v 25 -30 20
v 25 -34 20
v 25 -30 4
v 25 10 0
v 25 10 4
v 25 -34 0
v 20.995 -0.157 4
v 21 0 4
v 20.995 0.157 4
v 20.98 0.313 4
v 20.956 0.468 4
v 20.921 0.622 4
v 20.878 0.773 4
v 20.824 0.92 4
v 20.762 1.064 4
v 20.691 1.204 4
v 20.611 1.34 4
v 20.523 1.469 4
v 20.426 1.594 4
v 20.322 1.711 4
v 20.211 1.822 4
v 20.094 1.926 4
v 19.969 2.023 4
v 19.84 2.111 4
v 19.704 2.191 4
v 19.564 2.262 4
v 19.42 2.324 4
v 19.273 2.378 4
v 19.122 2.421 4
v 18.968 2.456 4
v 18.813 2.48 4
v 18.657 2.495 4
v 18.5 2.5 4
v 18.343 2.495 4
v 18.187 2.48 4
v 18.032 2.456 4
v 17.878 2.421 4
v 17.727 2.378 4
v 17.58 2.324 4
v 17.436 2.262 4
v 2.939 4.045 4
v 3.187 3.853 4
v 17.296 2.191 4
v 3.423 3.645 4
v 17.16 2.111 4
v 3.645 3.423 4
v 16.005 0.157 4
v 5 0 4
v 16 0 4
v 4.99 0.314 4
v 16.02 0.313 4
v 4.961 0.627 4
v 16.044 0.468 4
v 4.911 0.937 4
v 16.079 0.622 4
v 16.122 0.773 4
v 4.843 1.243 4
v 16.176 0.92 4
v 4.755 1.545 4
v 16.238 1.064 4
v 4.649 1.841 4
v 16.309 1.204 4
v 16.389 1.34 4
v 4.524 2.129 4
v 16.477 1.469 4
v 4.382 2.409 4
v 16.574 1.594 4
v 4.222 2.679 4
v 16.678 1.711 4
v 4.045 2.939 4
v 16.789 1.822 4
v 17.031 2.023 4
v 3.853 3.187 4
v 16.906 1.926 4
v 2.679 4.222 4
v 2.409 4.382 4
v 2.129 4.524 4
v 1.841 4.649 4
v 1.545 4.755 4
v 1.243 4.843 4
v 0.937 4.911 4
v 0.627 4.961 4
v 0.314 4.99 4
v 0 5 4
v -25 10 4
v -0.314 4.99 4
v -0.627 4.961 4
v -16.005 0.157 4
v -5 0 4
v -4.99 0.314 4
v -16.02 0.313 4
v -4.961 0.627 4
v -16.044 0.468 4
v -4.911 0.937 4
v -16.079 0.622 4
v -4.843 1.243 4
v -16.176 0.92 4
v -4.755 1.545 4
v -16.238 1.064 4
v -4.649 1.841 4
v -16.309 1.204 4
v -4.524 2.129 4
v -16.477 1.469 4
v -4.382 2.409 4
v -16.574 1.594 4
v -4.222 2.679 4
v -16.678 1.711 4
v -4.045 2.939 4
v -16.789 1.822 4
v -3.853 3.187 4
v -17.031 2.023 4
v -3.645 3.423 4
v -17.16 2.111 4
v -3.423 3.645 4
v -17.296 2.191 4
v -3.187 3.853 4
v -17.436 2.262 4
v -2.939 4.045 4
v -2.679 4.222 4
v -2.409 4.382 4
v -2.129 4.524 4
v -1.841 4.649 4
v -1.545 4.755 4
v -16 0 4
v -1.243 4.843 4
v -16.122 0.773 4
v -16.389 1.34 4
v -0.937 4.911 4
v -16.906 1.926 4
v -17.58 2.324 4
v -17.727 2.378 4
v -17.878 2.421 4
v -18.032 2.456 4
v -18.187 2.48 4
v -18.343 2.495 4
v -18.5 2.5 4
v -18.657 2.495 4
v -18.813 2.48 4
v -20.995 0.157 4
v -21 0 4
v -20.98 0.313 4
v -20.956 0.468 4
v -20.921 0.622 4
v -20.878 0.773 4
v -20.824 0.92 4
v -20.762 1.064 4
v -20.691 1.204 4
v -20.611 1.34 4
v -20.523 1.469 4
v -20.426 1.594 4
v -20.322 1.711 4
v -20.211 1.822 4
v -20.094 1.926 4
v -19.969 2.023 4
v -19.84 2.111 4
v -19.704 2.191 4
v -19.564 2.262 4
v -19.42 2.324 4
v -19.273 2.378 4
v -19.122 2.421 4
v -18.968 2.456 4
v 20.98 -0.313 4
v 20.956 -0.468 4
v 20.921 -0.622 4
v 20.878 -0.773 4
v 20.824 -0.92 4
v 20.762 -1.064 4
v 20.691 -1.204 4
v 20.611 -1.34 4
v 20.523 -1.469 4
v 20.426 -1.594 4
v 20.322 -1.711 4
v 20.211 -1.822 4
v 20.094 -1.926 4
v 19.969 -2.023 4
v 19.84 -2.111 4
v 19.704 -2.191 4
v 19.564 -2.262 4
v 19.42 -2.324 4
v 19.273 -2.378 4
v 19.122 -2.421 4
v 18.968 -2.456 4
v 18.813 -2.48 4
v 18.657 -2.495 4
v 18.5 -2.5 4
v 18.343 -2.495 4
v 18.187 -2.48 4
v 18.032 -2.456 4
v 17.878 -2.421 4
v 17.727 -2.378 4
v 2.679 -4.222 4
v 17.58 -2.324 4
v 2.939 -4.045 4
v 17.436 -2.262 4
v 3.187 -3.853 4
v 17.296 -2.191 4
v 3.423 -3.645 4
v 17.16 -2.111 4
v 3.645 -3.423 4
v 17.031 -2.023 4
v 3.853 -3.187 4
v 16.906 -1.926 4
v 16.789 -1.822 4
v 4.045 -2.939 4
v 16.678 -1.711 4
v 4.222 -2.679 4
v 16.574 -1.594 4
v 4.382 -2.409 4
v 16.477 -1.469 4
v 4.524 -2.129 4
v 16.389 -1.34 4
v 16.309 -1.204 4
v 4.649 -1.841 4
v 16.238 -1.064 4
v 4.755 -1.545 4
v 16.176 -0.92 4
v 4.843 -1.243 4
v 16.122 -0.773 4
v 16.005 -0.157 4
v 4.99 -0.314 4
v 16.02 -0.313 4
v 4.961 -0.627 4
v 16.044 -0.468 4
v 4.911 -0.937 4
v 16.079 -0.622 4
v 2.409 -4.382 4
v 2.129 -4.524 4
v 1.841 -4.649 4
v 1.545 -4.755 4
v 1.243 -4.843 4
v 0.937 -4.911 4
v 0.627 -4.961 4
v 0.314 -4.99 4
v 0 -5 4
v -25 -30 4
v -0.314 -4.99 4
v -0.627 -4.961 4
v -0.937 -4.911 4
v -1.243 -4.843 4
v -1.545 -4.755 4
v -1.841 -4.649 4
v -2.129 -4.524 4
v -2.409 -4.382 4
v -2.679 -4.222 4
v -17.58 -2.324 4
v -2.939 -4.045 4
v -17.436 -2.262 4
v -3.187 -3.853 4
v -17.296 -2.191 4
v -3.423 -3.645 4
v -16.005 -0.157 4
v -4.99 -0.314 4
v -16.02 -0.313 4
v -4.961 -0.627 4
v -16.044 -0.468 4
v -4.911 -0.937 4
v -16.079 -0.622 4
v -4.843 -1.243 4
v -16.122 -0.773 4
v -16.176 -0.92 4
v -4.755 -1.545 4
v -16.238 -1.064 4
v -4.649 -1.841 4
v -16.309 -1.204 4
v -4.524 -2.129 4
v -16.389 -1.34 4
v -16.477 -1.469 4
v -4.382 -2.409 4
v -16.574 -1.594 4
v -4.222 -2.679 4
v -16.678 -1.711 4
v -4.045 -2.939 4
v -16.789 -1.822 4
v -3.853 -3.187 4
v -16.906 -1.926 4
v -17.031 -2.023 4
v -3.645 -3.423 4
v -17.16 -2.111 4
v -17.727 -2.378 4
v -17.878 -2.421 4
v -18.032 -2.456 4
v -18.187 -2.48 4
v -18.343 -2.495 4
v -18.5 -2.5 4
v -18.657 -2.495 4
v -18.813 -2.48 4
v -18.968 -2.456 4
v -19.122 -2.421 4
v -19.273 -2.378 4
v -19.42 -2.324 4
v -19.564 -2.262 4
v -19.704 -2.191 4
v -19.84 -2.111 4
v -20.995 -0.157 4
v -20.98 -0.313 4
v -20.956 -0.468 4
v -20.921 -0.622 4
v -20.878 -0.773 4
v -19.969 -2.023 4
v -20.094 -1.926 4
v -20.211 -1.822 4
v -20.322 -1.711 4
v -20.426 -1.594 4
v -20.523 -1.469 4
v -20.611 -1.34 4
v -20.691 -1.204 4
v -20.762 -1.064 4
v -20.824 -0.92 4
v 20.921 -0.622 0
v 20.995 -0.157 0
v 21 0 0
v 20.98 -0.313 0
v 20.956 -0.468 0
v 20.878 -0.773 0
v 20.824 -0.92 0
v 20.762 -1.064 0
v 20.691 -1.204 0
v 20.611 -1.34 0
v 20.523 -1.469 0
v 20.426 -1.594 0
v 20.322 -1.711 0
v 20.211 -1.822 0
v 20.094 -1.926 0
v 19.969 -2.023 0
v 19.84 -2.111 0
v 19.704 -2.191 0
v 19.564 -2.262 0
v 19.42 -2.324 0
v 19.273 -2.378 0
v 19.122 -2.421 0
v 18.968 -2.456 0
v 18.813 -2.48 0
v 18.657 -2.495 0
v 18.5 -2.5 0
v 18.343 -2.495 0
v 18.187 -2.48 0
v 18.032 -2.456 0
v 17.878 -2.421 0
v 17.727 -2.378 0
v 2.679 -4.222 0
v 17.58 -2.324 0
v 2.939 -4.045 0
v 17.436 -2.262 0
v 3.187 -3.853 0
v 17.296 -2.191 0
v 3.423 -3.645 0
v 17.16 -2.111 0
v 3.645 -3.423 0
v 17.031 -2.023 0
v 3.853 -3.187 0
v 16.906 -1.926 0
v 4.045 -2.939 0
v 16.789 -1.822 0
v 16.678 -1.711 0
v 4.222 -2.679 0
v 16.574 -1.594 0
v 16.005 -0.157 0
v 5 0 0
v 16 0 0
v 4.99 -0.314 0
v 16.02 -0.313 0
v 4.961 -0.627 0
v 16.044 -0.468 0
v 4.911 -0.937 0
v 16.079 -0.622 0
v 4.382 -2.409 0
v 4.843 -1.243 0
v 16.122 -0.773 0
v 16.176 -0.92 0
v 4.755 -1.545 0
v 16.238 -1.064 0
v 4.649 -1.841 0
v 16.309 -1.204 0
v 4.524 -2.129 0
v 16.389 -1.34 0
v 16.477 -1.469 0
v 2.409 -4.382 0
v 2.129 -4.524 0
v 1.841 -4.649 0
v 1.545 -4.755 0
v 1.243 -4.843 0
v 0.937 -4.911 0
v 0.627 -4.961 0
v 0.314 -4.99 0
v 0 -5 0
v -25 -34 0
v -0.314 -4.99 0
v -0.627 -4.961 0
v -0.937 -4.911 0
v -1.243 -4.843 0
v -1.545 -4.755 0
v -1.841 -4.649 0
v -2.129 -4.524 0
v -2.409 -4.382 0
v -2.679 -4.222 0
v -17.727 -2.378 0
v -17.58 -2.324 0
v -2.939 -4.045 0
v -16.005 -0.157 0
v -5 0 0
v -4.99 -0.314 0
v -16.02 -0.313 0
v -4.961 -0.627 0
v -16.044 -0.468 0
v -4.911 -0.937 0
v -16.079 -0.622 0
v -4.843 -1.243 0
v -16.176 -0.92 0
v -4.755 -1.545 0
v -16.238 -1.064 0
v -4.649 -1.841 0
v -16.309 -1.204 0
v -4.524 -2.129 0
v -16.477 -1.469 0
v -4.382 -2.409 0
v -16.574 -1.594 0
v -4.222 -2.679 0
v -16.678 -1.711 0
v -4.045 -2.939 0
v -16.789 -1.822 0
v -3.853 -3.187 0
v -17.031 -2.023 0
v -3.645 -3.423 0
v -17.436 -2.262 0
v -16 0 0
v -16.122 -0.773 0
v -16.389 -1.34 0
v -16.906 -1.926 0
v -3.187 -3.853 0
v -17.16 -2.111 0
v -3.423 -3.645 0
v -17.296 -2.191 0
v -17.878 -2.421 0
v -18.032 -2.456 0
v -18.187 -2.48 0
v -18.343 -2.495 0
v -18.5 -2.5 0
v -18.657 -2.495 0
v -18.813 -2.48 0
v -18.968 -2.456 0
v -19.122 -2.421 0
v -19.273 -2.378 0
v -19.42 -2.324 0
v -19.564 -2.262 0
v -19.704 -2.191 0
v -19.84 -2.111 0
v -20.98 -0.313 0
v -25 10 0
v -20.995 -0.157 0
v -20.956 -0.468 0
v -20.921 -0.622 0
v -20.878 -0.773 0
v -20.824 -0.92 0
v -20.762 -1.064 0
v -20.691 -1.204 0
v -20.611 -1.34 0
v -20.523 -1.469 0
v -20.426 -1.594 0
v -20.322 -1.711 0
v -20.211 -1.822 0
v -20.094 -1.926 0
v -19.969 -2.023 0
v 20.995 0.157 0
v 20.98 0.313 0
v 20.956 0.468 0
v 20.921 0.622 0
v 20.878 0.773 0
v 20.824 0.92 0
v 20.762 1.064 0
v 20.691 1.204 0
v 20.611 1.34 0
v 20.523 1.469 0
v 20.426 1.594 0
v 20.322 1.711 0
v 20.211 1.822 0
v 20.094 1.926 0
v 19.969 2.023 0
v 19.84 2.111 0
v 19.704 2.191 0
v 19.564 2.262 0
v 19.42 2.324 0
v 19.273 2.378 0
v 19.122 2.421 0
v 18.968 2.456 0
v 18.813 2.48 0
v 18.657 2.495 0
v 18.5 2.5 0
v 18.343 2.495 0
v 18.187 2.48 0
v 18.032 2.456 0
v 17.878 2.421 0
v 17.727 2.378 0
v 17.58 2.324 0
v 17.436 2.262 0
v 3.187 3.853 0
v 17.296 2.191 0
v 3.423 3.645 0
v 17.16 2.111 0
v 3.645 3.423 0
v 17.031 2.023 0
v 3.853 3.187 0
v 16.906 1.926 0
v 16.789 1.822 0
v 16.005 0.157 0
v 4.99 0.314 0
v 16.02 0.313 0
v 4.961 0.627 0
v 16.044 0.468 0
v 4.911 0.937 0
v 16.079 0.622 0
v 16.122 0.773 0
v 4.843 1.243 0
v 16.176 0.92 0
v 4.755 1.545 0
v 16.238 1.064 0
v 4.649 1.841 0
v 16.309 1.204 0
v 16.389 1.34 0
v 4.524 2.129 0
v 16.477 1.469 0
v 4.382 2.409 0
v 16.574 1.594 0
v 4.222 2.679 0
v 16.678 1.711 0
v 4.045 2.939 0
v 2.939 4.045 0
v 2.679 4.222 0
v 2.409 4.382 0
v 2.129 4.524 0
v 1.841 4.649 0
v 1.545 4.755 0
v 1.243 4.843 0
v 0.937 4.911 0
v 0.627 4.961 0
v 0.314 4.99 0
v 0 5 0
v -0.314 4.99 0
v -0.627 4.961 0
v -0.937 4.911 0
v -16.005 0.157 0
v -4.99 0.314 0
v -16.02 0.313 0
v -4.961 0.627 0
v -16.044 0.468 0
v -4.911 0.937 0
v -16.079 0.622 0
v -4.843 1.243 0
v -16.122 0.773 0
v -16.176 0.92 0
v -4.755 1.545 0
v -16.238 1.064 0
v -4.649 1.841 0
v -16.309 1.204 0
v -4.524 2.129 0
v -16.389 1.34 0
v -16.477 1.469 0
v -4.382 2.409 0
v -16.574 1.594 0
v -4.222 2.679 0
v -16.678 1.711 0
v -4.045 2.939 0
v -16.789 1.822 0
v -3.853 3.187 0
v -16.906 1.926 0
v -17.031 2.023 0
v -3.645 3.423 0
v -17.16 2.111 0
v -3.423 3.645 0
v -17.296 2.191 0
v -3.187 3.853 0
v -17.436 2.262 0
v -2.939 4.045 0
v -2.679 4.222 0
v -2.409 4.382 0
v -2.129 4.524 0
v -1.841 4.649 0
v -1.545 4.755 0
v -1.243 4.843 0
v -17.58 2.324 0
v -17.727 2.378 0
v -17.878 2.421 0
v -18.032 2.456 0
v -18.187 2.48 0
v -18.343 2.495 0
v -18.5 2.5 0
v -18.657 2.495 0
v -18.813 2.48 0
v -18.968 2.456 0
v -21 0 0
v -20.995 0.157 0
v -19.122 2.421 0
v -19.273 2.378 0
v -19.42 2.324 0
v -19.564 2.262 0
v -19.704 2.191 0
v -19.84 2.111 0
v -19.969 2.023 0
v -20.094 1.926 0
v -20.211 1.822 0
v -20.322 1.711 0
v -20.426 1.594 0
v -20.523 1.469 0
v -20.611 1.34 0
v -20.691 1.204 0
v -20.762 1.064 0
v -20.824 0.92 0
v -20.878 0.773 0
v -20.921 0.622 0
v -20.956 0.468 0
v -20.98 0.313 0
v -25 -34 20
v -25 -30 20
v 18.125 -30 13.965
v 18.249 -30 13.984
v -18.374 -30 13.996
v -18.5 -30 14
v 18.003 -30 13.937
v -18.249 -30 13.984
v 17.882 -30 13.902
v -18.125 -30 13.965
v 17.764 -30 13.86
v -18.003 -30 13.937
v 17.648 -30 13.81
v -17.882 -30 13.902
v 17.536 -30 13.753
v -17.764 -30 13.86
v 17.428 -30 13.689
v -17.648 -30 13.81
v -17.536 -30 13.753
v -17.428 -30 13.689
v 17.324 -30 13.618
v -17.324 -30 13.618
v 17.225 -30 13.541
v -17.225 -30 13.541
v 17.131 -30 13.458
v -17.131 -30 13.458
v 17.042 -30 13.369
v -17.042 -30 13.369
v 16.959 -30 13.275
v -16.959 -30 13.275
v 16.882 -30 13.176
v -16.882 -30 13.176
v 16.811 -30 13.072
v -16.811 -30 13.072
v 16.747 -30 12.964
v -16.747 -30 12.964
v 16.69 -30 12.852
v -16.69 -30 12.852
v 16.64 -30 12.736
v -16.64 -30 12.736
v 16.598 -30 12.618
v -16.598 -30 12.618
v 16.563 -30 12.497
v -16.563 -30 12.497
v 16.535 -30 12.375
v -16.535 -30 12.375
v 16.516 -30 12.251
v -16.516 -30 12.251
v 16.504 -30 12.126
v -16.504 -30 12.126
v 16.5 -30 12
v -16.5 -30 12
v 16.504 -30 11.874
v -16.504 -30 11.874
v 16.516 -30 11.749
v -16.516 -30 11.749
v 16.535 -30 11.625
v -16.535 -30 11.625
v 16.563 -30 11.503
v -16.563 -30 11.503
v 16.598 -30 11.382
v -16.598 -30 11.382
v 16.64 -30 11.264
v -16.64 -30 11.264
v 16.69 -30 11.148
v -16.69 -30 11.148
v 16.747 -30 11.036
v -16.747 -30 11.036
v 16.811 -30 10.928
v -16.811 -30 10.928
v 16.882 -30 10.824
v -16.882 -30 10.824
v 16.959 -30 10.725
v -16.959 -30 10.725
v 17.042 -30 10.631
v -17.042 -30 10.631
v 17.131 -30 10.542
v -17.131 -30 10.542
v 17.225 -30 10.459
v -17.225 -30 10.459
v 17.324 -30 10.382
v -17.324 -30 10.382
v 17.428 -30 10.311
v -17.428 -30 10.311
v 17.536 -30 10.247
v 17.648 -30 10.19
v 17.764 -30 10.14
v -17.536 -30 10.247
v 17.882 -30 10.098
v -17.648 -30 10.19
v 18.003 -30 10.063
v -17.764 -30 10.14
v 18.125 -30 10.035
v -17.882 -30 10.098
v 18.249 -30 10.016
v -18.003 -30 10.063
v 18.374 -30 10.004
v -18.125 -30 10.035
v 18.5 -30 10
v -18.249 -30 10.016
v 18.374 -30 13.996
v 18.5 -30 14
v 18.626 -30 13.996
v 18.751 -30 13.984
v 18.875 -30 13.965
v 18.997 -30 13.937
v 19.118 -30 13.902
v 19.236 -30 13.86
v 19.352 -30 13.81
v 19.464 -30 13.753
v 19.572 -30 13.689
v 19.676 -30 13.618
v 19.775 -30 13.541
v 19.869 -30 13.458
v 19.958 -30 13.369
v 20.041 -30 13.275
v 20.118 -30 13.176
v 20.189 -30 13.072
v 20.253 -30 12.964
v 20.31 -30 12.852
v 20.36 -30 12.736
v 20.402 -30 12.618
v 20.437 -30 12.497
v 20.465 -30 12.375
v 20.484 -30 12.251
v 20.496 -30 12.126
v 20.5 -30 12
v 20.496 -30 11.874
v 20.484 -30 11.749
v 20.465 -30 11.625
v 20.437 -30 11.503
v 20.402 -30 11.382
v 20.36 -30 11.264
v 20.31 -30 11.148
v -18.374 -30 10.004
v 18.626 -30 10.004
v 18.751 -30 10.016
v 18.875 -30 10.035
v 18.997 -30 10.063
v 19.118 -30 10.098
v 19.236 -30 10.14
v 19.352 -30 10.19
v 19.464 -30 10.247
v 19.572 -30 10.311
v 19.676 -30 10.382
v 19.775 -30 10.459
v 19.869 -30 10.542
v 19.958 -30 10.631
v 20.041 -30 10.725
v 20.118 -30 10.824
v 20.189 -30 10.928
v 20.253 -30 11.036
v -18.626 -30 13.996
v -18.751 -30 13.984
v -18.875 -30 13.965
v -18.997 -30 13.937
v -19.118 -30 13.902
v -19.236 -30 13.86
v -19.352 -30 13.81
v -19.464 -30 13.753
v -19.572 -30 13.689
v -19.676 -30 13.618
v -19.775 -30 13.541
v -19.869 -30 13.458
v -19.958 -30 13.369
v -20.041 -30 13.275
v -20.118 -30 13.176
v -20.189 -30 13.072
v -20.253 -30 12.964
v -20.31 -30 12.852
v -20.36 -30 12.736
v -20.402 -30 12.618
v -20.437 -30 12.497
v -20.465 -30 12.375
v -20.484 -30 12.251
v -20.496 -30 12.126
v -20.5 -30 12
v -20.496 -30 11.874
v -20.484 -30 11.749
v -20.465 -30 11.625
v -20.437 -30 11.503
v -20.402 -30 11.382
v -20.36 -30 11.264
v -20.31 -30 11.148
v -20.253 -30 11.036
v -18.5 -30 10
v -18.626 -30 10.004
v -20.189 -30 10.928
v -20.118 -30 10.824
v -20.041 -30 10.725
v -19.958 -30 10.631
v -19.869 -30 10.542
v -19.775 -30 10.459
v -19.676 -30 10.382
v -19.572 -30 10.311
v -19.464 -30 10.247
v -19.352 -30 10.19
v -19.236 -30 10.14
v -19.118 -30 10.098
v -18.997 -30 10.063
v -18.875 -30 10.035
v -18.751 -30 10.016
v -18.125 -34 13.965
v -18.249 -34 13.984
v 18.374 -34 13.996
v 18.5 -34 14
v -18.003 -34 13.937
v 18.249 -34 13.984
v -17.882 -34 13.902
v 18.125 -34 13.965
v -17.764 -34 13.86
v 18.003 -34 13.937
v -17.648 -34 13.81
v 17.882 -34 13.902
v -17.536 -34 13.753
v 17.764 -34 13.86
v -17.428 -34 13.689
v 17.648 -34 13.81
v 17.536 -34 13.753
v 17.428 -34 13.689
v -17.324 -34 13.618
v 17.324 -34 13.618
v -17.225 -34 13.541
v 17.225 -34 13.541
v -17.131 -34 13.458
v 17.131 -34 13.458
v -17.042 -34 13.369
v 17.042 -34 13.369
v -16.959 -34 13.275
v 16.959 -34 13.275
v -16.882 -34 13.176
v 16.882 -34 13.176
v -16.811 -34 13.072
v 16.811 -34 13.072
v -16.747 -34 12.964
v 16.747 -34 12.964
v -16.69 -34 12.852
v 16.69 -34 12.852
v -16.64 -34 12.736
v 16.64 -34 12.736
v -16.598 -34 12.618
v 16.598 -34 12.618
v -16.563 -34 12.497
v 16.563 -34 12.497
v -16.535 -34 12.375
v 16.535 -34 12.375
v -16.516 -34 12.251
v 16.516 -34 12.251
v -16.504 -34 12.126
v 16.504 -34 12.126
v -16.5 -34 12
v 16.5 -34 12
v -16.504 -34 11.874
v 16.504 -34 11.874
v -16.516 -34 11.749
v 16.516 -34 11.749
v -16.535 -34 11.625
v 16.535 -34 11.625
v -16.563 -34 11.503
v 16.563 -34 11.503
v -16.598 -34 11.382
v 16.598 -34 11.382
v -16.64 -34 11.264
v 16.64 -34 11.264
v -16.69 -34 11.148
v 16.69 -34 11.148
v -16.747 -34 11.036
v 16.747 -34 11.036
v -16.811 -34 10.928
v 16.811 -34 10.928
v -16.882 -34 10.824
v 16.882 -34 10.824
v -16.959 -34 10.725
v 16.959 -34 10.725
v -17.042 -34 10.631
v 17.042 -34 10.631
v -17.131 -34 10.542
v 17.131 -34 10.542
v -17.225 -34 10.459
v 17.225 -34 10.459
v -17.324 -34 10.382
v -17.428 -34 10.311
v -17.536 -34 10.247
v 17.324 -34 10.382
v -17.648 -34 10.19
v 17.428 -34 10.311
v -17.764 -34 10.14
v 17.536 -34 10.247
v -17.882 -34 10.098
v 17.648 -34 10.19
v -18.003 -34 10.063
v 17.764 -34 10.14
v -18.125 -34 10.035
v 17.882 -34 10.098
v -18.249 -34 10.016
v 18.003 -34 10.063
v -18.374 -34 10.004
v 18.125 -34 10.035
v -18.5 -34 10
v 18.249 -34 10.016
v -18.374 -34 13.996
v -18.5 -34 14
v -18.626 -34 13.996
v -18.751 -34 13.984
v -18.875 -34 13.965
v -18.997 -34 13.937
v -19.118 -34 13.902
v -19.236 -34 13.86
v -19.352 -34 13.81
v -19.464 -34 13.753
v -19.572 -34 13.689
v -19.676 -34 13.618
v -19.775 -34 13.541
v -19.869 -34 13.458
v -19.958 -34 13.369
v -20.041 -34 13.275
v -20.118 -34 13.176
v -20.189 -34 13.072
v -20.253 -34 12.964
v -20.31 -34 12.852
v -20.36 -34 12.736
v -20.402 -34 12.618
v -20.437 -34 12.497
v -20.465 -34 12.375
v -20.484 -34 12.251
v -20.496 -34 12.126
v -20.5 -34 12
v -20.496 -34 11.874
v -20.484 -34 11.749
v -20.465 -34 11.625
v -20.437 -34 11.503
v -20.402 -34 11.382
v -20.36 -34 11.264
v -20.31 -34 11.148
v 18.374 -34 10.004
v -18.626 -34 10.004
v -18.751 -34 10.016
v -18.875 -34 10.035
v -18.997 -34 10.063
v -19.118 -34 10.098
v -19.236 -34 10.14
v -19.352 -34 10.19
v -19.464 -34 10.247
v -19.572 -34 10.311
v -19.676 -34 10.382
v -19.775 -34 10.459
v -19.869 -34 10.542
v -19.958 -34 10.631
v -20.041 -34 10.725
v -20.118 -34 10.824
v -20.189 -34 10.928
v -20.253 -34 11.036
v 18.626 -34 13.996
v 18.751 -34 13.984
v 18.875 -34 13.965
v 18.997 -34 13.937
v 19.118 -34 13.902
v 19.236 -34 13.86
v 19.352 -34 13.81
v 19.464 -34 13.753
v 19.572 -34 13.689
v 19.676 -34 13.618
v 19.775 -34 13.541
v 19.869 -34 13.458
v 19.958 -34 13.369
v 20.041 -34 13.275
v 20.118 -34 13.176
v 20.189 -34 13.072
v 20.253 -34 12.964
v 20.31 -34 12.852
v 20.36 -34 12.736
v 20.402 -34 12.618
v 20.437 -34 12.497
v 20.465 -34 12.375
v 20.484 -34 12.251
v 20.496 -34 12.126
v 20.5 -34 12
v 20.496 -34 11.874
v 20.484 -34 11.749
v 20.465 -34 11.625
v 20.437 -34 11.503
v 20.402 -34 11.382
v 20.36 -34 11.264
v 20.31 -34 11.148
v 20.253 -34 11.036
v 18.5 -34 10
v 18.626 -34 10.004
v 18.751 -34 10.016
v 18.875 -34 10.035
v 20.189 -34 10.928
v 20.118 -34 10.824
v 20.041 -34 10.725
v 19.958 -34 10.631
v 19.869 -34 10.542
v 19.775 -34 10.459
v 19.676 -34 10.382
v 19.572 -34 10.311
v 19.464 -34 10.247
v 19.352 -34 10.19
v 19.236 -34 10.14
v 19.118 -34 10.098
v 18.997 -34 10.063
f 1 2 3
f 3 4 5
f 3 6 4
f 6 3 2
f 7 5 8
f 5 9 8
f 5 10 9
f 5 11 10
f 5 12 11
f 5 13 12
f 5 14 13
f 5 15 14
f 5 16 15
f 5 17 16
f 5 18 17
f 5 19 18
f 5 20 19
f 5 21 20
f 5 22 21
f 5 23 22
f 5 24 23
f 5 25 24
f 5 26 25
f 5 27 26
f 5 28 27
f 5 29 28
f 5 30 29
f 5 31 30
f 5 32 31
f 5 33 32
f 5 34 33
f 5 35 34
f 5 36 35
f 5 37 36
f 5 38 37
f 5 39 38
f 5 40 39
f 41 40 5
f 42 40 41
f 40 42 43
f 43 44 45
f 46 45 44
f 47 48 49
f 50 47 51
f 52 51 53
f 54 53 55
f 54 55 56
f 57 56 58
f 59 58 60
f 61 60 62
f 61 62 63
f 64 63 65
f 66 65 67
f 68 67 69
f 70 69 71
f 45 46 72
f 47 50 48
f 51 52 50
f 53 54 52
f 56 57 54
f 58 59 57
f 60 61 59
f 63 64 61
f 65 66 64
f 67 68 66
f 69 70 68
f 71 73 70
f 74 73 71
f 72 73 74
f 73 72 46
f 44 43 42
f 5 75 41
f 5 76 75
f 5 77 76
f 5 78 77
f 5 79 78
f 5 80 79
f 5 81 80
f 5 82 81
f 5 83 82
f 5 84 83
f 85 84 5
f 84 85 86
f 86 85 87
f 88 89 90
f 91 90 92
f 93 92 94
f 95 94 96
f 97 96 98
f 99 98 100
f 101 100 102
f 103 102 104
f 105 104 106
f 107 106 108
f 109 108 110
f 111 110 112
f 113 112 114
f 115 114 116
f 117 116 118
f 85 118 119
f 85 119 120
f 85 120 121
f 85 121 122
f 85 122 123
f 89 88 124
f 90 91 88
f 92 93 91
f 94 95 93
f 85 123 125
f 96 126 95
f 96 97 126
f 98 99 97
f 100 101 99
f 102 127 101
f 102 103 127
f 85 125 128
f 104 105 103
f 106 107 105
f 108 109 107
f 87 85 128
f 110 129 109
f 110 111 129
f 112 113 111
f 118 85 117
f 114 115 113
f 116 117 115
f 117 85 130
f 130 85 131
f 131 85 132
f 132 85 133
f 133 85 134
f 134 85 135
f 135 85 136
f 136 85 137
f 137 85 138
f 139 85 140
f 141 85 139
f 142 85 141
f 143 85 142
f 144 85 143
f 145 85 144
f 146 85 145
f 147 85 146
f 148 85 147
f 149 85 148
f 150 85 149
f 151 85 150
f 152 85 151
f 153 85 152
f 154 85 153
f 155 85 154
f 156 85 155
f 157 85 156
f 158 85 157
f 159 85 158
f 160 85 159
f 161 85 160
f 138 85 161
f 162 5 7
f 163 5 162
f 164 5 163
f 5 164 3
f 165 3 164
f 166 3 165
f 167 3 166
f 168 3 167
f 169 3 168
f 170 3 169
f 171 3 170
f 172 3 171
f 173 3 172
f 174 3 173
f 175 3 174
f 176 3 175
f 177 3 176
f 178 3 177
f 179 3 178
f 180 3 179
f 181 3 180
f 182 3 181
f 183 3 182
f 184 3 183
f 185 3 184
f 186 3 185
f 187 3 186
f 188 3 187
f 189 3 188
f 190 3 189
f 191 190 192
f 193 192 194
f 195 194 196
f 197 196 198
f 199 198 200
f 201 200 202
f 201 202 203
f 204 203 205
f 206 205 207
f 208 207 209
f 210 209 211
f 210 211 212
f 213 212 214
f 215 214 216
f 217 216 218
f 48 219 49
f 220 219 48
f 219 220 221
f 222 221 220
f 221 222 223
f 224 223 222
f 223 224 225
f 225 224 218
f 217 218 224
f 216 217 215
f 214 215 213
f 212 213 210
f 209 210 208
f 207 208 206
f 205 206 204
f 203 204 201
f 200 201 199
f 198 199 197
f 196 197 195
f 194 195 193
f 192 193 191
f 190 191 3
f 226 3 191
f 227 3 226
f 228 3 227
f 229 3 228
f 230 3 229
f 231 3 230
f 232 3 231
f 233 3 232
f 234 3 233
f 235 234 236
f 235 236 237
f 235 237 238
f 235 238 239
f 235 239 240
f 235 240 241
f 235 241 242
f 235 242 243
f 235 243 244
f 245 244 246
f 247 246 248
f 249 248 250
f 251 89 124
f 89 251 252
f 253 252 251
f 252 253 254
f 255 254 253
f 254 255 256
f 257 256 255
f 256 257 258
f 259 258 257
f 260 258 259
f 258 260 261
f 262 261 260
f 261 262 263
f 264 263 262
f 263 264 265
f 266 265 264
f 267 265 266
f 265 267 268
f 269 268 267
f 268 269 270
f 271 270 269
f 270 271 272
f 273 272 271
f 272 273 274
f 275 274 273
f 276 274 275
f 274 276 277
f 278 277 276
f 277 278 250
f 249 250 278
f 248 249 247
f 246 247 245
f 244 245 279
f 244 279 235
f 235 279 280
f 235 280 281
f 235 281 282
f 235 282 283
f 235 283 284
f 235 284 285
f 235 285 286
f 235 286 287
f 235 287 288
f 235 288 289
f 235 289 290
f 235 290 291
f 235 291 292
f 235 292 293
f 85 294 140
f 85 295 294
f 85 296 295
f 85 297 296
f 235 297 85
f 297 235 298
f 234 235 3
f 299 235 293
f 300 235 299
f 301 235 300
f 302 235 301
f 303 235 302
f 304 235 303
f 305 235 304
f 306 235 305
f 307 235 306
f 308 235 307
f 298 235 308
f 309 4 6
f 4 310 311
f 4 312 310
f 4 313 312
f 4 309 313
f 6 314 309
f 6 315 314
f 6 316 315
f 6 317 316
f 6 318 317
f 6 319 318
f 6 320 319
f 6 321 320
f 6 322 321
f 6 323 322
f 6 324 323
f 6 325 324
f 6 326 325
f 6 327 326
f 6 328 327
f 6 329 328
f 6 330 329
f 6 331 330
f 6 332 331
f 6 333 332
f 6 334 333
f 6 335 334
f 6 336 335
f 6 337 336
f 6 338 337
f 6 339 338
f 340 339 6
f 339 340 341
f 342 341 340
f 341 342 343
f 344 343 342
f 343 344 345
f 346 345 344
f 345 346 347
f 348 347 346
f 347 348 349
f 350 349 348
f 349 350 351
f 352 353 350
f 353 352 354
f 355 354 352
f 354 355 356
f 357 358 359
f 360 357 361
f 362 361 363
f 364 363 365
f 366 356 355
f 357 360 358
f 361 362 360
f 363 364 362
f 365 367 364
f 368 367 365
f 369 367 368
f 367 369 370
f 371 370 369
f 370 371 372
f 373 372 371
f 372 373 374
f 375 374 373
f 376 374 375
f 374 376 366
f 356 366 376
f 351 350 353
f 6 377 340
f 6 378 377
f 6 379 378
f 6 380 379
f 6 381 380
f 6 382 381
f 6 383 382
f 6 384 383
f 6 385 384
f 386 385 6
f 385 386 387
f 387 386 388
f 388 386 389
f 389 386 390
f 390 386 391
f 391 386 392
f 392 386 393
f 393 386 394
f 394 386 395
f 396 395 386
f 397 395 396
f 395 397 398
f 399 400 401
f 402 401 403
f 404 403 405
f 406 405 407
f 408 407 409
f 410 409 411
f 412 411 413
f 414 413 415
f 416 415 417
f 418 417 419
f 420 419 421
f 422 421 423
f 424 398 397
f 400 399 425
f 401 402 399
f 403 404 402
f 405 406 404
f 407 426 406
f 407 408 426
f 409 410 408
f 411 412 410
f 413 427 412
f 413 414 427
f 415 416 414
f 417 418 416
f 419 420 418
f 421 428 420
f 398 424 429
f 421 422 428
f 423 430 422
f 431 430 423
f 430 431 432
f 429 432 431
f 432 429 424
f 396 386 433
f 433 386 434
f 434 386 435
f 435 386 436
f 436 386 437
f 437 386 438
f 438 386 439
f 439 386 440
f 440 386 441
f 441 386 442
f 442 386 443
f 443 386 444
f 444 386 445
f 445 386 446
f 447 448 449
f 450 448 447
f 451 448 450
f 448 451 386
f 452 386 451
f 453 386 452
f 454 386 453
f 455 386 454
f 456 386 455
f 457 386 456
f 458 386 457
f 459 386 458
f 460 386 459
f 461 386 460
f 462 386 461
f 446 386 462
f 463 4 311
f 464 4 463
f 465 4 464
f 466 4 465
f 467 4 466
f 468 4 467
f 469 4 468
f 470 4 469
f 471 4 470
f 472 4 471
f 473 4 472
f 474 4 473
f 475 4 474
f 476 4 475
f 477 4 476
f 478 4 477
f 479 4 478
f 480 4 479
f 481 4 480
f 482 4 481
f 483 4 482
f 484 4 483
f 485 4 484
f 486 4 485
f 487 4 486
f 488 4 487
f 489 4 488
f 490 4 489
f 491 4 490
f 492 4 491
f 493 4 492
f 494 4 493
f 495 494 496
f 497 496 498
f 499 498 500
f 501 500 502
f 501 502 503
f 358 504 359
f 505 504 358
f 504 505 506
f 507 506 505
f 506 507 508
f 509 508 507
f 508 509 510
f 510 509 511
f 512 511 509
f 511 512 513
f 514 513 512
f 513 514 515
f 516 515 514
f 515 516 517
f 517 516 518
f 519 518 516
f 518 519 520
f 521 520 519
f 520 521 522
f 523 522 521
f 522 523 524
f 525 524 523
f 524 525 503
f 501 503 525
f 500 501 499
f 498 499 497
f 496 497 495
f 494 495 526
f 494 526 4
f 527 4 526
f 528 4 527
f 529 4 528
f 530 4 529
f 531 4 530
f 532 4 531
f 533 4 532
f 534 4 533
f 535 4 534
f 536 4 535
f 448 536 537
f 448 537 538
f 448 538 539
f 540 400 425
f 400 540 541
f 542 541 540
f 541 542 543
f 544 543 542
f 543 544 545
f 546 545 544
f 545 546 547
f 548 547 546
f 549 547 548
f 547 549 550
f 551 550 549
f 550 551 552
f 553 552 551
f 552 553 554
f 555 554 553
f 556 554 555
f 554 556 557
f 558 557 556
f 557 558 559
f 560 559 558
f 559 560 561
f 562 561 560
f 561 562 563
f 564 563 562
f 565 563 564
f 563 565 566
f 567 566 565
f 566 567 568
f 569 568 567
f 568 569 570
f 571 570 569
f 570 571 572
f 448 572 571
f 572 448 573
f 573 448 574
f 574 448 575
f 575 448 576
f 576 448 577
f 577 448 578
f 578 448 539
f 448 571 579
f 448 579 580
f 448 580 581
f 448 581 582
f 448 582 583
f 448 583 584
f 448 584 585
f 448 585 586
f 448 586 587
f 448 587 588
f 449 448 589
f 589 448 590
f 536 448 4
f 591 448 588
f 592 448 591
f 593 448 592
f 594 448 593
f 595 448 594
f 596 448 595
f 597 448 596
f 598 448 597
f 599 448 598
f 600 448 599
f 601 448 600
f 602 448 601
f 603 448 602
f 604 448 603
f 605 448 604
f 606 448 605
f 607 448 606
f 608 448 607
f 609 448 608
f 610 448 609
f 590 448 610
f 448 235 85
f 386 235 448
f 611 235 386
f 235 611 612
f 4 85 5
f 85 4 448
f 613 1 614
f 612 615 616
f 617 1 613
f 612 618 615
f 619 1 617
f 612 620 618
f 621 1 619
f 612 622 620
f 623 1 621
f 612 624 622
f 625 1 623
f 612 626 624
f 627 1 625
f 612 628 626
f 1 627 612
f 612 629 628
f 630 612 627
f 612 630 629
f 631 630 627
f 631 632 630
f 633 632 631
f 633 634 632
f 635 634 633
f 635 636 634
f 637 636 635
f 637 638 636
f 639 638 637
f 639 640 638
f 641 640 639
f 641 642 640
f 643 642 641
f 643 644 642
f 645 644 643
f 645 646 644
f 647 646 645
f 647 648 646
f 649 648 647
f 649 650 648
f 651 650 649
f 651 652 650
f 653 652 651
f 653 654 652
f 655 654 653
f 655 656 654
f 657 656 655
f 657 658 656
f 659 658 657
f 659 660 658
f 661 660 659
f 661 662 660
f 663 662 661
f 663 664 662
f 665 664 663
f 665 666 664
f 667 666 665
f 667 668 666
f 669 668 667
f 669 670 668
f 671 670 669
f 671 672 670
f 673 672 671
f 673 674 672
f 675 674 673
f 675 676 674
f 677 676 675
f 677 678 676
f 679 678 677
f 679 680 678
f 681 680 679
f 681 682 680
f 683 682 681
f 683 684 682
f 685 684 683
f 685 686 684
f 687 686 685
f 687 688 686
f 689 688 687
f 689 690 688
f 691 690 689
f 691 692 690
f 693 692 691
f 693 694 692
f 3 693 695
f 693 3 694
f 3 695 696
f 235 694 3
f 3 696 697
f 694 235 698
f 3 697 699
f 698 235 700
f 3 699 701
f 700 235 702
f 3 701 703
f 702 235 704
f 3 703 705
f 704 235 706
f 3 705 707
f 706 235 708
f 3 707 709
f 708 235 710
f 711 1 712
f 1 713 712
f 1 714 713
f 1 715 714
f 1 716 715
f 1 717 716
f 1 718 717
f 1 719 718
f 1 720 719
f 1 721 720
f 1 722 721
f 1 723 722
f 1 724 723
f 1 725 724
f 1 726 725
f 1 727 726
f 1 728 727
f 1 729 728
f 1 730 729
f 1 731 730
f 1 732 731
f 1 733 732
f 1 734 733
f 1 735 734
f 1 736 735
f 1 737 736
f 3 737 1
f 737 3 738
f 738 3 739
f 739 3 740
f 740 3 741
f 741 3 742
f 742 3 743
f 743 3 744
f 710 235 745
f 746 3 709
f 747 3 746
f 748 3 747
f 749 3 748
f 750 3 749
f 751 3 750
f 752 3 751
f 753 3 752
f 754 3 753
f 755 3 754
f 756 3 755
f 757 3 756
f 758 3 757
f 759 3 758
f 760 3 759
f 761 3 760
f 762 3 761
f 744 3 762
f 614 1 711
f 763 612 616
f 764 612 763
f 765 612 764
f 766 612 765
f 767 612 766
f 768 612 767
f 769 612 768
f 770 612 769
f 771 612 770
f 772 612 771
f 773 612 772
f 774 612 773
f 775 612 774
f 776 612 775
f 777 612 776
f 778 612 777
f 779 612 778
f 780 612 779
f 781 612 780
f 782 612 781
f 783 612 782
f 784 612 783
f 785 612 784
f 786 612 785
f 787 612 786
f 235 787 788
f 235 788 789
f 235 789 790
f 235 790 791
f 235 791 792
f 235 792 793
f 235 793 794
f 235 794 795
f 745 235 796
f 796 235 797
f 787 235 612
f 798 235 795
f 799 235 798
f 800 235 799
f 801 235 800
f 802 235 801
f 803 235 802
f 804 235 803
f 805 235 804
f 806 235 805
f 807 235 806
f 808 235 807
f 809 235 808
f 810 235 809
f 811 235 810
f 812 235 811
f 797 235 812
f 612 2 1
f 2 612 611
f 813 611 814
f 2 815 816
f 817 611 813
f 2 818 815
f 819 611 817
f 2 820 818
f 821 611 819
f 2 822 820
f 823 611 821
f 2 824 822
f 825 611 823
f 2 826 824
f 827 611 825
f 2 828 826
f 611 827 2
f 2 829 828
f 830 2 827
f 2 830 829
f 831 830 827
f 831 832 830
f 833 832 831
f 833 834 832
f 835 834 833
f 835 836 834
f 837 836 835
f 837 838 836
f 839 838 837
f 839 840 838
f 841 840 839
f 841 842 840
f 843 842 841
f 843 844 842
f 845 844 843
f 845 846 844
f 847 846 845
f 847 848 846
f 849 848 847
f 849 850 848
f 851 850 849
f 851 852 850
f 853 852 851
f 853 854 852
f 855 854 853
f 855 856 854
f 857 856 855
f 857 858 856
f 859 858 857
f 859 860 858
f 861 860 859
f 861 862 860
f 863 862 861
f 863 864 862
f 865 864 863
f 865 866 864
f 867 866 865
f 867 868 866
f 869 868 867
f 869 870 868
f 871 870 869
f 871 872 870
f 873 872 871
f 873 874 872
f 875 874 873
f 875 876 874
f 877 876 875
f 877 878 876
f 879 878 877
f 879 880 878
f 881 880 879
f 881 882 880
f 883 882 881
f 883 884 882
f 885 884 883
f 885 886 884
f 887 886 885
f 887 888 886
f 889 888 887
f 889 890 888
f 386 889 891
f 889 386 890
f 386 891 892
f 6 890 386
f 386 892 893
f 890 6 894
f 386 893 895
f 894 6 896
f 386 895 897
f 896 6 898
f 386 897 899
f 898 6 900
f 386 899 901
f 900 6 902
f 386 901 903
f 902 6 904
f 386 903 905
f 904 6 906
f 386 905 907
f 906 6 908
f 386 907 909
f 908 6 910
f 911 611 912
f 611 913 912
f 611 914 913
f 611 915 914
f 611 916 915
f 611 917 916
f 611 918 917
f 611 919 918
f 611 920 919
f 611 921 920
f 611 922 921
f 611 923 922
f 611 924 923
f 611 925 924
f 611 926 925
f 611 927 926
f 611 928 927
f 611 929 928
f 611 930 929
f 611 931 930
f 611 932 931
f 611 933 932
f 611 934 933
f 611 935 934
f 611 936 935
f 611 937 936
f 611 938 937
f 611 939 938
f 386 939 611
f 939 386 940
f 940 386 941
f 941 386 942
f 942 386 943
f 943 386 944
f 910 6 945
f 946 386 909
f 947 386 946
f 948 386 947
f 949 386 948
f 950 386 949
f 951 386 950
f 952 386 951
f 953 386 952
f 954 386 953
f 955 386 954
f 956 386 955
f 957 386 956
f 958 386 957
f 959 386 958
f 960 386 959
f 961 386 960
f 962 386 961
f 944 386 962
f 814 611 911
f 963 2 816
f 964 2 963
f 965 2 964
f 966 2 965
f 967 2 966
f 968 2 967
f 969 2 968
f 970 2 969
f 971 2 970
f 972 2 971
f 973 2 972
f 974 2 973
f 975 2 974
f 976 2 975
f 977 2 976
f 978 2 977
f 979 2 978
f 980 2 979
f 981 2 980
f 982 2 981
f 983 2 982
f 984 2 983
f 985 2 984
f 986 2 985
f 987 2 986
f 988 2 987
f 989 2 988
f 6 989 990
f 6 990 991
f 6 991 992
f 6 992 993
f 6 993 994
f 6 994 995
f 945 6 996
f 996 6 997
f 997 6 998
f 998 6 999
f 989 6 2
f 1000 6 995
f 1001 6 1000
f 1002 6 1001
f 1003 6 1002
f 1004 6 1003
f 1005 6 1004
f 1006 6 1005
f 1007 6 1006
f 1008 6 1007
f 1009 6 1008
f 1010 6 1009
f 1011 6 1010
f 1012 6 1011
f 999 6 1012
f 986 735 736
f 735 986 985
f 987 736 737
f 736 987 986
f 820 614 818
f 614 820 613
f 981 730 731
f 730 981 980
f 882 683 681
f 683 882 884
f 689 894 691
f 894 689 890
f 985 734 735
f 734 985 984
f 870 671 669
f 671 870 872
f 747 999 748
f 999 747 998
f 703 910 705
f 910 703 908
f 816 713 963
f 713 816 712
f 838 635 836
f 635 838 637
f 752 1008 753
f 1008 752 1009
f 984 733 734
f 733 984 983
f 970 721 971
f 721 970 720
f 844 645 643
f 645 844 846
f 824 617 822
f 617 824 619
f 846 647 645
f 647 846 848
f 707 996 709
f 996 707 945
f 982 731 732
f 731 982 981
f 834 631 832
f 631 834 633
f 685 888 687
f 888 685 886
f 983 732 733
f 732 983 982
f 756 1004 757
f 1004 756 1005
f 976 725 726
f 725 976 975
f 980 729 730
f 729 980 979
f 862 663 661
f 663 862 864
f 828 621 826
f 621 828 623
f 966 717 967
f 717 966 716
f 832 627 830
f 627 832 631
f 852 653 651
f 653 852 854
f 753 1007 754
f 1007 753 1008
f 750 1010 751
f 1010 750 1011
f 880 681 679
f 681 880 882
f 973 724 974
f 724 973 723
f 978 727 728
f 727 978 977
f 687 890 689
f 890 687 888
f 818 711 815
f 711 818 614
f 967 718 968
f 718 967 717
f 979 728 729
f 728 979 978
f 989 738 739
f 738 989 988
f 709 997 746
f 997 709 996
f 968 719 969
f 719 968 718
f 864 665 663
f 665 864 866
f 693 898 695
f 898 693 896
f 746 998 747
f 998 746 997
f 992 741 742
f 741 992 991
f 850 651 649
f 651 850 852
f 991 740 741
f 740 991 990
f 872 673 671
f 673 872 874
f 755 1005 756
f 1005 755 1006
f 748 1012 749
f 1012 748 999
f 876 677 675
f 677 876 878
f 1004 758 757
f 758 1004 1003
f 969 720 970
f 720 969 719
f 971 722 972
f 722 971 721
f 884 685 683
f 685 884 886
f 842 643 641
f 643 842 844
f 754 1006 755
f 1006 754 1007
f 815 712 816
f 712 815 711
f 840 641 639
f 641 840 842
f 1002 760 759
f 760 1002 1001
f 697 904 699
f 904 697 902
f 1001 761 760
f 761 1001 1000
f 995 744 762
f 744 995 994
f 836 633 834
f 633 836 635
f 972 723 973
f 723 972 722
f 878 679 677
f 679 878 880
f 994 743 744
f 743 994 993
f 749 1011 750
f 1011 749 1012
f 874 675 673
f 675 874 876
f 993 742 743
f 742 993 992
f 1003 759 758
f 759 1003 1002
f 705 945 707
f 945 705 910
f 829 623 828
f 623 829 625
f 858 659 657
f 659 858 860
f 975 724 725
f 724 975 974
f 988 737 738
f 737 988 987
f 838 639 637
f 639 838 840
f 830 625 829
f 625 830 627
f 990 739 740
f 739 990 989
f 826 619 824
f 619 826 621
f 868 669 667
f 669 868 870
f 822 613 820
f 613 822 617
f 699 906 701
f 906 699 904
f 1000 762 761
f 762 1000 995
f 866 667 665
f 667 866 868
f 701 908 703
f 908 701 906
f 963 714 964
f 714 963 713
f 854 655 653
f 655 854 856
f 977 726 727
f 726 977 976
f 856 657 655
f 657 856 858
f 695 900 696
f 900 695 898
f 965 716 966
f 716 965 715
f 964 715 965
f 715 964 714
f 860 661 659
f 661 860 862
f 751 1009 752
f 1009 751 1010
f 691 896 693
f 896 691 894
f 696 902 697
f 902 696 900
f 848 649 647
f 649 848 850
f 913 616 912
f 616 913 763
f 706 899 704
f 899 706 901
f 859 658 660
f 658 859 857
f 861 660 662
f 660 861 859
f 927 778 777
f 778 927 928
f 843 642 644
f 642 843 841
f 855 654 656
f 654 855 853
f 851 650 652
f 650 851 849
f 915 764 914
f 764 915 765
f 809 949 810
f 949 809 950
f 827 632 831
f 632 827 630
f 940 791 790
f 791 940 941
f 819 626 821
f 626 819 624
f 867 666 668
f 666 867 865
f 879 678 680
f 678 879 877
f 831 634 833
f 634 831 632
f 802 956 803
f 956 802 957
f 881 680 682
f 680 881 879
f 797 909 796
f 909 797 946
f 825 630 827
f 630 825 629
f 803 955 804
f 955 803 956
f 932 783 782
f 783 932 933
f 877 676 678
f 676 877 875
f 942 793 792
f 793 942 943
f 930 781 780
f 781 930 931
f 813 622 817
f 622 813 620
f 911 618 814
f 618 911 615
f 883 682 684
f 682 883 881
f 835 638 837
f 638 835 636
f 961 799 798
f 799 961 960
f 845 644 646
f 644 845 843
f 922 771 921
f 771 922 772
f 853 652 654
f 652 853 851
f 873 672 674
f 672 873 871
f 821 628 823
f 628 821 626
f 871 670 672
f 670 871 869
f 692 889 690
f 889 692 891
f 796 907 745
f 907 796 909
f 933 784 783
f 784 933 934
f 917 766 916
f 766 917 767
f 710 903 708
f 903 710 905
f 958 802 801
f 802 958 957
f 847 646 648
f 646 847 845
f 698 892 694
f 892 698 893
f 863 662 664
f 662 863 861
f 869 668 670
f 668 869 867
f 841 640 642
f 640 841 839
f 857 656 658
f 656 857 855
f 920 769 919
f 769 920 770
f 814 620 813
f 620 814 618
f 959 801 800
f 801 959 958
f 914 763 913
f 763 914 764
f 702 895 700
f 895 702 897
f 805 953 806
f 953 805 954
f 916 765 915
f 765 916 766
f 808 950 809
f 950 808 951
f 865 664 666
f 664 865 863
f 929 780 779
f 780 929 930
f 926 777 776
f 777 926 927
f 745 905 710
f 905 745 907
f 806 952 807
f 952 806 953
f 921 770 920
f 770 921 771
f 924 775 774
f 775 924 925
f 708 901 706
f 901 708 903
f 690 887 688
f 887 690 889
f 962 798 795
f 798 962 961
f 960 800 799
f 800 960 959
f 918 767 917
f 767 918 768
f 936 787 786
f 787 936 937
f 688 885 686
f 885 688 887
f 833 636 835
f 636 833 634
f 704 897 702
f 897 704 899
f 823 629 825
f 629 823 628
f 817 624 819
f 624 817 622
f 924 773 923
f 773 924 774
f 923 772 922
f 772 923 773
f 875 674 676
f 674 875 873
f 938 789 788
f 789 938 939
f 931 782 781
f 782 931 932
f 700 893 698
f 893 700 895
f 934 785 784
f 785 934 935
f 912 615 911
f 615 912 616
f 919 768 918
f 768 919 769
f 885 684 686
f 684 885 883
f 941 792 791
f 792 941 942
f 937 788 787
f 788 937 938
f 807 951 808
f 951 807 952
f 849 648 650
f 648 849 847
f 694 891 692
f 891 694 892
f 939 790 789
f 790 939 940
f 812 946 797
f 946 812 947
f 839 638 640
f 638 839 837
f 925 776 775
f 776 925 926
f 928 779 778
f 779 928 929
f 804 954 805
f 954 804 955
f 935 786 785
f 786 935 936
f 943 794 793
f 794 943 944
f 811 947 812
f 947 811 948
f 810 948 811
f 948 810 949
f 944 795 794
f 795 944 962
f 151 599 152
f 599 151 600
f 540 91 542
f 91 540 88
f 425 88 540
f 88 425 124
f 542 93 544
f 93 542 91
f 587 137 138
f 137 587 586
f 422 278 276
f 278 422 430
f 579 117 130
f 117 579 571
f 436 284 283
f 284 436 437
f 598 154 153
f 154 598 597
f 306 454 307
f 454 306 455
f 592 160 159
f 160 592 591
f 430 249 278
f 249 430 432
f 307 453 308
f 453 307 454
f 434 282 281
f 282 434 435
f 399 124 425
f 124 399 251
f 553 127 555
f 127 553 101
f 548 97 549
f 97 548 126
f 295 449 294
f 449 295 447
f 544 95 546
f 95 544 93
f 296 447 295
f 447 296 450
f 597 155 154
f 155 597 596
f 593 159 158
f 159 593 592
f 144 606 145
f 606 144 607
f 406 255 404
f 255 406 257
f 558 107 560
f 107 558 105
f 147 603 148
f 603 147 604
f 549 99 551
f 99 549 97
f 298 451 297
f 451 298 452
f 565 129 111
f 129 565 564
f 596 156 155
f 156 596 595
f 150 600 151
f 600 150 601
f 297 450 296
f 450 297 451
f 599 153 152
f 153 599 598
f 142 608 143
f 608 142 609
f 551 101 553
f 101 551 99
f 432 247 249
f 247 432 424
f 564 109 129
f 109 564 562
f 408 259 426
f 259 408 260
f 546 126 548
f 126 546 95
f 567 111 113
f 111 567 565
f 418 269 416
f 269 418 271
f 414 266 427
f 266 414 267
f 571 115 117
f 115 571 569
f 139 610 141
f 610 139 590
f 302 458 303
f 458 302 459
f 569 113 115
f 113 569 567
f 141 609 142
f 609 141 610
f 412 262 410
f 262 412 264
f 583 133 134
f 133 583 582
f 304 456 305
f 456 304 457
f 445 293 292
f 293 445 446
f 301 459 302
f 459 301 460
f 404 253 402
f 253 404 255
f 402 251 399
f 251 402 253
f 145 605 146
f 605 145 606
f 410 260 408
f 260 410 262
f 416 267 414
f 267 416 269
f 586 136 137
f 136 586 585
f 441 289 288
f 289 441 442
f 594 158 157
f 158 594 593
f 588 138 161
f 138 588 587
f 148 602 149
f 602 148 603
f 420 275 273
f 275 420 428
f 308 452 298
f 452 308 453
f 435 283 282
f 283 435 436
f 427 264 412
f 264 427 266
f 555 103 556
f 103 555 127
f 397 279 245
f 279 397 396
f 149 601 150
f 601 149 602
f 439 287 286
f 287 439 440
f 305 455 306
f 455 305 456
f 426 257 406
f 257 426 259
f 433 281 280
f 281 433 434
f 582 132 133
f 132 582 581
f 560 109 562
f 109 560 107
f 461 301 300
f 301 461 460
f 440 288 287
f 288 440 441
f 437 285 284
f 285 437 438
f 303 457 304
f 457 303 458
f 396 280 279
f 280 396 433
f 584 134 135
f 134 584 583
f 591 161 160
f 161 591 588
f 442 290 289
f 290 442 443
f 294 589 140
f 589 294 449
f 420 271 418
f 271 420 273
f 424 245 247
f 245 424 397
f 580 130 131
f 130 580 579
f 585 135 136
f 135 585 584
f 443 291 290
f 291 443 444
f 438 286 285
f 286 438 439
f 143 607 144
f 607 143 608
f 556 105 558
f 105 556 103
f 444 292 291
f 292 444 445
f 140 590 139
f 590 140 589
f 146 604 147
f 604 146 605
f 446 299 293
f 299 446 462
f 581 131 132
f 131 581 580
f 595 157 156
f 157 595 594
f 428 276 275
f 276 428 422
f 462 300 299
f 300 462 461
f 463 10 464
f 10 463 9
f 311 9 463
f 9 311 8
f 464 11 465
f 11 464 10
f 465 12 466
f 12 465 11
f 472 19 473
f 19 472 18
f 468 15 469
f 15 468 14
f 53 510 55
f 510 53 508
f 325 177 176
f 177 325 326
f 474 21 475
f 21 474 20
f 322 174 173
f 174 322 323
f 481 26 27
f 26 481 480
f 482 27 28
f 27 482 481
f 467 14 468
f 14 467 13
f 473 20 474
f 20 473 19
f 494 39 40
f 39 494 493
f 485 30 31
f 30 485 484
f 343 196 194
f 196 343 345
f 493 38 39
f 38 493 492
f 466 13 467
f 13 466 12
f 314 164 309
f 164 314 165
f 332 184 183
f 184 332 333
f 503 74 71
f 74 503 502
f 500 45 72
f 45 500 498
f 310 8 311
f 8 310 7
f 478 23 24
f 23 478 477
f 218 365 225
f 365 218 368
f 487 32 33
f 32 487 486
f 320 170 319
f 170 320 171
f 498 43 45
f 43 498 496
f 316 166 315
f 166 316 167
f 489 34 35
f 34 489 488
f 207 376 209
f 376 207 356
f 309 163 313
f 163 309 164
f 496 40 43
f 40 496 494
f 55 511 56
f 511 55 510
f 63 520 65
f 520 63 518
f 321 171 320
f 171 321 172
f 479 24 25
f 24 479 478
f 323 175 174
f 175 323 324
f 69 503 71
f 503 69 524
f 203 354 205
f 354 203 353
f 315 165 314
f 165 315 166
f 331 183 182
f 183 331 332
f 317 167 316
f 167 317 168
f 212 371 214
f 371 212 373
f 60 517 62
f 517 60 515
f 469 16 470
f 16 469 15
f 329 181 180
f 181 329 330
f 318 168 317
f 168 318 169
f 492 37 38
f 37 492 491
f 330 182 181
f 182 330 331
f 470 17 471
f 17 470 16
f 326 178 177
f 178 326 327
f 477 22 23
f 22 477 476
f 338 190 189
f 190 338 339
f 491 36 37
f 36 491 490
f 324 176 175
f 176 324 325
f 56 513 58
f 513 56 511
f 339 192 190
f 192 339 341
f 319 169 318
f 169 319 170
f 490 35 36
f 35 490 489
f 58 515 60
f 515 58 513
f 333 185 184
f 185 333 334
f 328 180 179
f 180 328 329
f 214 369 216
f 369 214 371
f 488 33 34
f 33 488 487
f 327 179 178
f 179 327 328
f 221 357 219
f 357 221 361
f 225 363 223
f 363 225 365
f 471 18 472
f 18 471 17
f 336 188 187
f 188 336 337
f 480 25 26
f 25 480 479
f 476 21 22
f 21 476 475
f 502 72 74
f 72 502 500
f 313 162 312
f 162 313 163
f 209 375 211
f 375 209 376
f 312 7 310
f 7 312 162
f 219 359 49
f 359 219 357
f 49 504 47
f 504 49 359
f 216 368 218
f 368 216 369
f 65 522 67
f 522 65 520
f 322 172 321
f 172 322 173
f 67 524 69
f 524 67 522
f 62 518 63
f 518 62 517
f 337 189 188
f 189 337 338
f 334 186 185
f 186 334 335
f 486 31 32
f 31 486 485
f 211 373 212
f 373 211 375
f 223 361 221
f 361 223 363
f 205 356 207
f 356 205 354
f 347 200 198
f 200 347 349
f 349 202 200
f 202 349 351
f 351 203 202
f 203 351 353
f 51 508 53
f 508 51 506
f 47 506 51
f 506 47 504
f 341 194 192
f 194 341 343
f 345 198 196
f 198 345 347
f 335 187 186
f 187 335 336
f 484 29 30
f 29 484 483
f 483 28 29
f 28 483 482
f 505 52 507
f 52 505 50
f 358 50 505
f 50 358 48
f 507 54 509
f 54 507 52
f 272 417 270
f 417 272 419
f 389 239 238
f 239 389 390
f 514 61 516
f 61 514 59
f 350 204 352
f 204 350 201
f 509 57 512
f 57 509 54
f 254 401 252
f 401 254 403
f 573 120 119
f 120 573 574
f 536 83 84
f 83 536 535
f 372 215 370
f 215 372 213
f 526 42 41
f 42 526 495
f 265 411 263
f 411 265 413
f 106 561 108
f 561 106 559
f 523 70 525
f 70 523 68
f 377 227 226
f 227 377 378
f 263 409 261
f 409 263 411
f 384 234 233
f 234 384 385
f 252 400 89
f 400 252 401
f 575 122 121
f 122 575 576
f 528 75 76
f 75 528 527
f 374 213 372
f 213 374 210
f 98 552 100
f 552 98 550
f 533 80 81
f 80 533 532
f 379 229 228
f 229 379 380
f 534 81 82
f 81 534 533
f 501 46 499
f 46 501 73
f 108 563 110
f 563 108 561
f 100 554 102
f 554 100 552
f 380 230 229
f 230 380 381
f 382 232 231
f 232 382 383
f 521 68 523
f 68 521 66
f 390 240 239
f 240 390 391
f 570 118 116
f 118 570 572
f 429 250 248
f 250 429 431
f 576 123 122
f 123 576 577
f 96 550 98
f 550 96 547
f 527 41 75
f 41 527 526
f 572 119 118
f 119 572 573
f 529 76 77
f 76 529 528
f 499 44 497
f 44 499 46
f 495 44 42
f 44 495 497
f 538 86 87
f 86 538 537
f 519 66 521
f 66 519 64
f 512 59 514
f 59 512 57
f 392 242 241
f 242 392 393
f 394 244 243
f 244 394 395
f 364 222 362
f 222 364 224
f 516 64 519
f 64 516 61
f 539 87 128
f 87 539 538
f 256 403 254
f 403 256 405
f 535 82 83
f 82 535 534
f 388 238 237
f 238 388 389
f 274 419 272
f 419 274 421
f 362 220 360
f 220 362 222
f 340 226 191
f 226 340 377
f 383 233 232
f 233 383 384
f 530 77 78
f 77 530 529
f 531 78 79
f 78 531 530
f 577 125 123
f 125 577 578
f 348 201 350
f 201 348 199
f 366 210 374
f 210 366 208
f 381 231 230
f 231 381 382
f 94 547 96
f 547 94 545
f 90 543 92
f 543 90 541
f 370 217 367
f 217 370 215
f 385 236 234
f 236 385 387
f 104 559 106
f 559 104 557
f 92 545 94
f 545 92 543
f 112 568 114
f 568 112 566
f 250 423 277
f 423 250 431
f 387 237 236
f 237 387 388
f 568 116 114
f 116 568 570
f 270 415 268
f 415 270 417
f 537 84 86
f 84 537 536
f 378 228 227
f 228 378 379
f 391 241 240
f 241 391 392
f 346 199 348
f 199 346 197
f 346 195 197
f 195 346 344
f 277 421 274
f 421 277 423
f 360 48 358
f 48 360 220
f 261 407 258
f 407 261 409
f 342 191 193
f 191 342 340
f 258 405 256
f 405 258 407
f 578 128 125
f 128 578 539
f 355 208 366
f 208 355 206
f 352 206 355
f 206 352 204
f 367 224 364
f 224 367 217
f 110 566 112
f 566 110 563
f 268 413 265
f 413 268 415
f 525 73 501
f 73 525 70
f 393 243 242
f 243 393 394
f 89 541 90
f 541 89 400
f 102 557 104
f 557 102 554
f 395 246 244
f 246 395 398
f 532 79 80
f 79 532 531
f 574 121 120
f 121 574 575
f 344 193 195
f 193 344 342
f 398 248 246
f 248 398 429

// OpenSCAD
difference(){
	union(){




      translate([-25,-30,0]){
            cube([50,40,4], center=false);
      }
      translate([-25,-34,0]){
            cube([50,4,20], center=false);
      }




}
	union() {

        translate([18.5,0,12]){
            rotate([90,0,0]){
                cylinder(h=500, r=2, $fn=100, center=false);
            }
        }
        translate([-18.5,0,12]){
            rotate([90,0,0]){
                cylinder(h=500, r=2, $fn=100, center=false);
            }
        }

        translate([-18.5,-34+34,-1]){
            rotate([0,0,0]){
                cylinder(h=500, r=2.5, $fn=100, center=false);
            }
        }
        translate([18.5,-34+34,-1]){
            rotate([0,0,0]){
                cylinder(h=500, r=2.5, $fn=100, center=false);
            }
        }
        translate([0,-34+34,-1]){
            rotate([0,0,0]){
                cylinder(h=500, r=5, $fn=100, center=false);
            }
        }




    

      
	}
}
